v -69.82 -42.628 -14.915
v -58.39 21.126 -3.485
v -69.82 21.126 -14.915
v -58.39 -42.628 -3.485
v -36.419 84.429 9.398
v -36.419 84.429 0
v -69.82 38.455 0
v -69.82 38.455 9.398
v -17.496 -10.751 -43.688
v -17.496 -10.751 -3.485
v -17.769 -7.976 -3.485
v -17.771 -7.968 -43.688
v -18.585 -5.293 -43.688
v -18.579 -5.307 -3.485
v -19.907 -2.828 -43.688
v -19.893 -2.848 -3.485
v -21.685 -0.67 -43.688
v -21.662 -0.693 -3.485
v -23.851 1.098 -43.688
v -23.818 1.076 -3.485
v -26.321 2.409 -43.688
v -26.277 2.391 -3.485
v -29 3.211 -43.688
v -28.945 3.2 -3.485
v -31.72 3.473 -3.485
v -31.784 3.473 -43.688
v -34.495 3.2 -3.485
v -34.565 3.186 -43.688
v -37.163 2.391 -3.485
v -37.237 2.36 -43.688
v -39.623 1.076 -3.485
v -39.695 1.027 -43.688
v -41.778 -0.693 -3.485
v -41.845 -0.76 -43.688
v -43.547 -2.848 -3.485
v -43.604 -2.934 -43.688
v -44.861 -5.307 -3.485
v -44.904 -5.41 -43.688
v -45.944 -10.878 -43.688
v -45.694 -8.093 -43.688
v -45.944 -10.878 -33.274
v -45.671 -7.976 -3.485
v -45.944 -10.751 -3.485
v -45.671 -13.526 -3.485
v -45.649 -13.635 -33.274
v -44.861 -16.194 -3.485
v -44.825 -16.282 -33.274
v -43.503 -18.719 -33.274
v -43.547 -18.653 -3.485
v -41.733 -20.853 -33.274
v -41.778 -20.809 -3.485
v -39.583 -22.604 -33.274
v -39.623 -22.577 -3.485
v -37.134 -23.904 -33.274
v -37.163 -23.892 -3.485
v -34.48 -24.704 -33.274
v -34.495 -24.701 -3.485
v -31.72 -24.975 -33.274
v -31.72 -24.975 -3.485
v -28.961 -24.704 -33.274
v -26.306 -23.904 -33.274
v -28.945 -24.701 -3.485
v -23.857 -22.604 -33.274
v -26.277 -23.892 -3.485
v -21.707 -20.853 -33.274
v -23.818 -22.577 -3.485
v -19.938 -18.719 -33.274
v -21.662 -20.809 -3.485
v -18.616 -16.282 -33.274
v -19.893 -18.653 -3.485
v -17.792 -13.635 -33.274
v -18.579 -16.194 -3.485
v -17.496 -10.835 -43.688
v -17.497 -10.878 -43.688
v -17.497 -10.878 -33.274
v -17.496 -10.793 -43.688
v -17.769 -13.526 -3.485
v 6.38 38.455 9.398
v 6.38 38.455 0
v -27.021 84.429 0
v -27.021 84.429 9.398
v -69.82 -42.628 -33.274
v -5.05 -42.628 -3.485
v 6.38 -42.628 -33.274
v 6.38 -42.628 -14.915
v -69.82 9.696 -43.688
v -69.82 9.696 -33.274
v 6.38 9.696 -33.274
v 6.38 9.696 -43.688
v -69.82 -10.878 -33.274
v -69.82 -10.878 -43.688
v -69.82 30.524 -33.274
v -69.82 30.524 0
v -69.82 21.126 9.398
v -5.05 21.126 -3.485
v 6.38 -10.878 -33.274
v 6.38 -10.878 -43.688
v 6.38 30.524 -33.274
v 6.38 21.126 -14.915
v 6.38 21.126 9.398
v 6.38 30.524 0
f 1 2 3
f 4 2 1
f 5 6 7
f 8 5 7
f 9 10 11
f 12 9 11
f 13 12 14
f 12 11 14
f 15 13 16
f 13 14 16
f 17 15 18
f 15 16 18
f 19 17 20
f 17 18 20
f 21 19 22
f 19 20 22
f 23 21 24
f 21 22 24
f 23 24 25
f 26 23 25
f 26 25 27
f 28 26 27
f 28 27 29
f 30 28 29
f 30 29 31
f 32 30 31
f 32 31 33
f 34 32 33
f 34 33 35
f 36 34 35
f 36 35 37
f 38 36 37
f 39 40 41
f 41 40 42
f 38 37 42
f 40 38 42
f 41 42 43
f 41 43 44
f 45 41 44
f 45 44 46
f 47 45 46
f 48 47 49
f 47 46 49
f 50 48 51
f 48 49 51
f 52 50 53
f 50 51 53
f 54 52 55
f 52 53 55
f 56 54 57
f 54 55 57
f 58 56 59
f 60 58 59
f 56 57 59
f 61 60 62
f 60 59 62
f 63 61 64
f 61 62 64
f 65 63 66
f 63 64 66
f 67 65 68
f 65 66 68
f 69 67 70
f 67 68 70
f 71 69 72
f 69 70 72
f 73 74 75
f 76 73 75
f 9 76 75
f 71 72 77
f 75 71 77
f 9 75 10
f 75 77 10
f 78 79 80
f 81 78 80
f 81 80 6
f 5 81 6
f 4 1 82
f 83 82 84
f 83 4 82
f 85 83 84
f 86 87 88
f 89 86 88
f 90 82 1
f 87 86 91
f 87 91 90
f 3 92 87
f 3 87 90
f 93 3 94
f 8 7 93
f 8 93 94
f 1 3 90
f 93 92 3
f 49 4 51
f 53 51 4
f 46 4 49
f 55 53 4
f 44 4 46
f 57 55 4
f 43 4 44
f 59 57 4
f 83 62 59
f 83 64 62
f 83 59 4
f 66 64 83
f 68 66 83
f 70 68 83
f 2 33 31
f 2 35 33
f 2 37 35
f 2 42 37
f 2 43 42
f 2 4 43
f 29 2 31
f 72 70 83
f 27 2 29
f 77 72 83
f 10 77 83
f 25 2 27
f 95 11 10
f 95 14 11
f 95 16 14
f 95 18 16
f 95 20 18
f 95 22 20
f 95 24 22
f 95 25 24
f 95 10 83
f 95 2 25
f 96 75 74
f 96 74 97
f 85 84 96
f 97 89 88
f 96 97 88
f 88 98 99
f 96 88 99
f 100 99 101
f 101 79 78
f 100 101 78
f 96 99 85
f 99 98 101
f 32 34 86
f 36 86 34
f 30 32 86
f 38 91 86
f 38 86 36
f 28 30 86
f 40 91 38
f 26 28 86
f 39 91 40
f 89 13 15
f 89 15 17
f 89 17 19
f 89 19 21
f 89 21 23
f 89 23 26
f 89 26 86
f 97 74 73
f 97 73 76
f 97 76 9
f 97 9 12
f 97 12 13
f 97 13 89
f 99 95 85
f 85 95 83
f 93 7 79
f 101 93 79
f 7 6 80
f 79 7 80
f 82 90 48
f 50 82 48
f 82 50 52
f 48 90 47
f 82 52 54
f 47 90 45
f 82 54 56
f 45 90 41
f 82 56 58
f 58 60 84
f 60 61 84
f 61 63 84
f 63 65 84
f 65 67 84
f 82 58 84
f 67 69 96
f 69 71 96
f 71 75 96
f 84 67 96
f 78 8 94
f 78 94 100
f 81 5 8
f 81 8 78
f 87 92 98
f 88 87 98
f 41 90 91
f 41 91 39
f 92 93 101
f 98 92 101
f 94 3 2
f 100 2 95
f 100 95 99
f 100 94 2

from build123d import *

# Parameters (mm, degrees)
F1_DEPTH  = 9.398
F2_W      = 76.2
F2_H      = 33.274
F3_DEPTH  = 9.398
F4_W      = 76.2
F4_H      = 29.7886691538
F5_DEPTH  = 63.754
F6_SIZE   = 11.43
F7_W      = 76.2
F7_H      = 20.574
F8_DEPTH  = 10.414
F9_R      = 14.224
F10_DEPTH = 58.928


with BuildPart() as f1:
    # F0 (on Top) → F1 (new body)
    with BuildSketch(Plane.XY):
        Polygon((-69.8201261675, 38.4550108689), (-69.8201261675, 21.1263484053), (6.3798738325, 21.1263484053), (6.3798738325, 38.4550108689), (-27.0211261675, 84.4290108689), (-36.4191261675, 84.4290108689), align=None)
    extrude(amount=F1_DEPTH)

    # F2 (on face) → F3 (join)
    with BuildSketch(Plane.XZ.offset(-21.1263484053)):
        with Locations((-31.7201261675, -16.637)):
            Rectangle(F2_W, F2_H)
    extrude(amount=-F3_DEPTH)

    # F4 (on face) → F5 (join)
    with BuildSketch(Plane.XZ.offset(-21.1263484053)):
        with Locations((-31.7201261675, -18.3796654231)):
            Rectangle(F4_W, F4_H)
    extrude(amount=F5_DEPTH)

    # F6
    f6_edges = [f1.edges().sort_by_distance(p)[0] for p in [
        (6.379874, -10.750652, -3.485331),
        (-69.820126, -10.750652, -3.485331),
    ]]
    chamfer(f6_edges, length=F6_SIZE)

    # F7 (on face) → F8 (join)
    with BuildSketch(Plane(origin=(0, 0, -33.274), x_dir=(1, 0, 0), z_dir=(0, 0, -1))):
        with Locations((-31.7201261675, 0.5906515947)):
            Rectangle(F7_W, F7_H)
    extrude(amount=F8_DEPTH)

    # F9 (on face) → F10 (cut)
    with BuildSketch(Plane.XY.offset(-3.4853308462)):
        with Locations((-31.7201261675, -10.7506515947)):
            Circle(F9_R)
    extrude(amount=-F10_DEPTH, mode=Mode.SUBTRACT)


solid = f1.part
